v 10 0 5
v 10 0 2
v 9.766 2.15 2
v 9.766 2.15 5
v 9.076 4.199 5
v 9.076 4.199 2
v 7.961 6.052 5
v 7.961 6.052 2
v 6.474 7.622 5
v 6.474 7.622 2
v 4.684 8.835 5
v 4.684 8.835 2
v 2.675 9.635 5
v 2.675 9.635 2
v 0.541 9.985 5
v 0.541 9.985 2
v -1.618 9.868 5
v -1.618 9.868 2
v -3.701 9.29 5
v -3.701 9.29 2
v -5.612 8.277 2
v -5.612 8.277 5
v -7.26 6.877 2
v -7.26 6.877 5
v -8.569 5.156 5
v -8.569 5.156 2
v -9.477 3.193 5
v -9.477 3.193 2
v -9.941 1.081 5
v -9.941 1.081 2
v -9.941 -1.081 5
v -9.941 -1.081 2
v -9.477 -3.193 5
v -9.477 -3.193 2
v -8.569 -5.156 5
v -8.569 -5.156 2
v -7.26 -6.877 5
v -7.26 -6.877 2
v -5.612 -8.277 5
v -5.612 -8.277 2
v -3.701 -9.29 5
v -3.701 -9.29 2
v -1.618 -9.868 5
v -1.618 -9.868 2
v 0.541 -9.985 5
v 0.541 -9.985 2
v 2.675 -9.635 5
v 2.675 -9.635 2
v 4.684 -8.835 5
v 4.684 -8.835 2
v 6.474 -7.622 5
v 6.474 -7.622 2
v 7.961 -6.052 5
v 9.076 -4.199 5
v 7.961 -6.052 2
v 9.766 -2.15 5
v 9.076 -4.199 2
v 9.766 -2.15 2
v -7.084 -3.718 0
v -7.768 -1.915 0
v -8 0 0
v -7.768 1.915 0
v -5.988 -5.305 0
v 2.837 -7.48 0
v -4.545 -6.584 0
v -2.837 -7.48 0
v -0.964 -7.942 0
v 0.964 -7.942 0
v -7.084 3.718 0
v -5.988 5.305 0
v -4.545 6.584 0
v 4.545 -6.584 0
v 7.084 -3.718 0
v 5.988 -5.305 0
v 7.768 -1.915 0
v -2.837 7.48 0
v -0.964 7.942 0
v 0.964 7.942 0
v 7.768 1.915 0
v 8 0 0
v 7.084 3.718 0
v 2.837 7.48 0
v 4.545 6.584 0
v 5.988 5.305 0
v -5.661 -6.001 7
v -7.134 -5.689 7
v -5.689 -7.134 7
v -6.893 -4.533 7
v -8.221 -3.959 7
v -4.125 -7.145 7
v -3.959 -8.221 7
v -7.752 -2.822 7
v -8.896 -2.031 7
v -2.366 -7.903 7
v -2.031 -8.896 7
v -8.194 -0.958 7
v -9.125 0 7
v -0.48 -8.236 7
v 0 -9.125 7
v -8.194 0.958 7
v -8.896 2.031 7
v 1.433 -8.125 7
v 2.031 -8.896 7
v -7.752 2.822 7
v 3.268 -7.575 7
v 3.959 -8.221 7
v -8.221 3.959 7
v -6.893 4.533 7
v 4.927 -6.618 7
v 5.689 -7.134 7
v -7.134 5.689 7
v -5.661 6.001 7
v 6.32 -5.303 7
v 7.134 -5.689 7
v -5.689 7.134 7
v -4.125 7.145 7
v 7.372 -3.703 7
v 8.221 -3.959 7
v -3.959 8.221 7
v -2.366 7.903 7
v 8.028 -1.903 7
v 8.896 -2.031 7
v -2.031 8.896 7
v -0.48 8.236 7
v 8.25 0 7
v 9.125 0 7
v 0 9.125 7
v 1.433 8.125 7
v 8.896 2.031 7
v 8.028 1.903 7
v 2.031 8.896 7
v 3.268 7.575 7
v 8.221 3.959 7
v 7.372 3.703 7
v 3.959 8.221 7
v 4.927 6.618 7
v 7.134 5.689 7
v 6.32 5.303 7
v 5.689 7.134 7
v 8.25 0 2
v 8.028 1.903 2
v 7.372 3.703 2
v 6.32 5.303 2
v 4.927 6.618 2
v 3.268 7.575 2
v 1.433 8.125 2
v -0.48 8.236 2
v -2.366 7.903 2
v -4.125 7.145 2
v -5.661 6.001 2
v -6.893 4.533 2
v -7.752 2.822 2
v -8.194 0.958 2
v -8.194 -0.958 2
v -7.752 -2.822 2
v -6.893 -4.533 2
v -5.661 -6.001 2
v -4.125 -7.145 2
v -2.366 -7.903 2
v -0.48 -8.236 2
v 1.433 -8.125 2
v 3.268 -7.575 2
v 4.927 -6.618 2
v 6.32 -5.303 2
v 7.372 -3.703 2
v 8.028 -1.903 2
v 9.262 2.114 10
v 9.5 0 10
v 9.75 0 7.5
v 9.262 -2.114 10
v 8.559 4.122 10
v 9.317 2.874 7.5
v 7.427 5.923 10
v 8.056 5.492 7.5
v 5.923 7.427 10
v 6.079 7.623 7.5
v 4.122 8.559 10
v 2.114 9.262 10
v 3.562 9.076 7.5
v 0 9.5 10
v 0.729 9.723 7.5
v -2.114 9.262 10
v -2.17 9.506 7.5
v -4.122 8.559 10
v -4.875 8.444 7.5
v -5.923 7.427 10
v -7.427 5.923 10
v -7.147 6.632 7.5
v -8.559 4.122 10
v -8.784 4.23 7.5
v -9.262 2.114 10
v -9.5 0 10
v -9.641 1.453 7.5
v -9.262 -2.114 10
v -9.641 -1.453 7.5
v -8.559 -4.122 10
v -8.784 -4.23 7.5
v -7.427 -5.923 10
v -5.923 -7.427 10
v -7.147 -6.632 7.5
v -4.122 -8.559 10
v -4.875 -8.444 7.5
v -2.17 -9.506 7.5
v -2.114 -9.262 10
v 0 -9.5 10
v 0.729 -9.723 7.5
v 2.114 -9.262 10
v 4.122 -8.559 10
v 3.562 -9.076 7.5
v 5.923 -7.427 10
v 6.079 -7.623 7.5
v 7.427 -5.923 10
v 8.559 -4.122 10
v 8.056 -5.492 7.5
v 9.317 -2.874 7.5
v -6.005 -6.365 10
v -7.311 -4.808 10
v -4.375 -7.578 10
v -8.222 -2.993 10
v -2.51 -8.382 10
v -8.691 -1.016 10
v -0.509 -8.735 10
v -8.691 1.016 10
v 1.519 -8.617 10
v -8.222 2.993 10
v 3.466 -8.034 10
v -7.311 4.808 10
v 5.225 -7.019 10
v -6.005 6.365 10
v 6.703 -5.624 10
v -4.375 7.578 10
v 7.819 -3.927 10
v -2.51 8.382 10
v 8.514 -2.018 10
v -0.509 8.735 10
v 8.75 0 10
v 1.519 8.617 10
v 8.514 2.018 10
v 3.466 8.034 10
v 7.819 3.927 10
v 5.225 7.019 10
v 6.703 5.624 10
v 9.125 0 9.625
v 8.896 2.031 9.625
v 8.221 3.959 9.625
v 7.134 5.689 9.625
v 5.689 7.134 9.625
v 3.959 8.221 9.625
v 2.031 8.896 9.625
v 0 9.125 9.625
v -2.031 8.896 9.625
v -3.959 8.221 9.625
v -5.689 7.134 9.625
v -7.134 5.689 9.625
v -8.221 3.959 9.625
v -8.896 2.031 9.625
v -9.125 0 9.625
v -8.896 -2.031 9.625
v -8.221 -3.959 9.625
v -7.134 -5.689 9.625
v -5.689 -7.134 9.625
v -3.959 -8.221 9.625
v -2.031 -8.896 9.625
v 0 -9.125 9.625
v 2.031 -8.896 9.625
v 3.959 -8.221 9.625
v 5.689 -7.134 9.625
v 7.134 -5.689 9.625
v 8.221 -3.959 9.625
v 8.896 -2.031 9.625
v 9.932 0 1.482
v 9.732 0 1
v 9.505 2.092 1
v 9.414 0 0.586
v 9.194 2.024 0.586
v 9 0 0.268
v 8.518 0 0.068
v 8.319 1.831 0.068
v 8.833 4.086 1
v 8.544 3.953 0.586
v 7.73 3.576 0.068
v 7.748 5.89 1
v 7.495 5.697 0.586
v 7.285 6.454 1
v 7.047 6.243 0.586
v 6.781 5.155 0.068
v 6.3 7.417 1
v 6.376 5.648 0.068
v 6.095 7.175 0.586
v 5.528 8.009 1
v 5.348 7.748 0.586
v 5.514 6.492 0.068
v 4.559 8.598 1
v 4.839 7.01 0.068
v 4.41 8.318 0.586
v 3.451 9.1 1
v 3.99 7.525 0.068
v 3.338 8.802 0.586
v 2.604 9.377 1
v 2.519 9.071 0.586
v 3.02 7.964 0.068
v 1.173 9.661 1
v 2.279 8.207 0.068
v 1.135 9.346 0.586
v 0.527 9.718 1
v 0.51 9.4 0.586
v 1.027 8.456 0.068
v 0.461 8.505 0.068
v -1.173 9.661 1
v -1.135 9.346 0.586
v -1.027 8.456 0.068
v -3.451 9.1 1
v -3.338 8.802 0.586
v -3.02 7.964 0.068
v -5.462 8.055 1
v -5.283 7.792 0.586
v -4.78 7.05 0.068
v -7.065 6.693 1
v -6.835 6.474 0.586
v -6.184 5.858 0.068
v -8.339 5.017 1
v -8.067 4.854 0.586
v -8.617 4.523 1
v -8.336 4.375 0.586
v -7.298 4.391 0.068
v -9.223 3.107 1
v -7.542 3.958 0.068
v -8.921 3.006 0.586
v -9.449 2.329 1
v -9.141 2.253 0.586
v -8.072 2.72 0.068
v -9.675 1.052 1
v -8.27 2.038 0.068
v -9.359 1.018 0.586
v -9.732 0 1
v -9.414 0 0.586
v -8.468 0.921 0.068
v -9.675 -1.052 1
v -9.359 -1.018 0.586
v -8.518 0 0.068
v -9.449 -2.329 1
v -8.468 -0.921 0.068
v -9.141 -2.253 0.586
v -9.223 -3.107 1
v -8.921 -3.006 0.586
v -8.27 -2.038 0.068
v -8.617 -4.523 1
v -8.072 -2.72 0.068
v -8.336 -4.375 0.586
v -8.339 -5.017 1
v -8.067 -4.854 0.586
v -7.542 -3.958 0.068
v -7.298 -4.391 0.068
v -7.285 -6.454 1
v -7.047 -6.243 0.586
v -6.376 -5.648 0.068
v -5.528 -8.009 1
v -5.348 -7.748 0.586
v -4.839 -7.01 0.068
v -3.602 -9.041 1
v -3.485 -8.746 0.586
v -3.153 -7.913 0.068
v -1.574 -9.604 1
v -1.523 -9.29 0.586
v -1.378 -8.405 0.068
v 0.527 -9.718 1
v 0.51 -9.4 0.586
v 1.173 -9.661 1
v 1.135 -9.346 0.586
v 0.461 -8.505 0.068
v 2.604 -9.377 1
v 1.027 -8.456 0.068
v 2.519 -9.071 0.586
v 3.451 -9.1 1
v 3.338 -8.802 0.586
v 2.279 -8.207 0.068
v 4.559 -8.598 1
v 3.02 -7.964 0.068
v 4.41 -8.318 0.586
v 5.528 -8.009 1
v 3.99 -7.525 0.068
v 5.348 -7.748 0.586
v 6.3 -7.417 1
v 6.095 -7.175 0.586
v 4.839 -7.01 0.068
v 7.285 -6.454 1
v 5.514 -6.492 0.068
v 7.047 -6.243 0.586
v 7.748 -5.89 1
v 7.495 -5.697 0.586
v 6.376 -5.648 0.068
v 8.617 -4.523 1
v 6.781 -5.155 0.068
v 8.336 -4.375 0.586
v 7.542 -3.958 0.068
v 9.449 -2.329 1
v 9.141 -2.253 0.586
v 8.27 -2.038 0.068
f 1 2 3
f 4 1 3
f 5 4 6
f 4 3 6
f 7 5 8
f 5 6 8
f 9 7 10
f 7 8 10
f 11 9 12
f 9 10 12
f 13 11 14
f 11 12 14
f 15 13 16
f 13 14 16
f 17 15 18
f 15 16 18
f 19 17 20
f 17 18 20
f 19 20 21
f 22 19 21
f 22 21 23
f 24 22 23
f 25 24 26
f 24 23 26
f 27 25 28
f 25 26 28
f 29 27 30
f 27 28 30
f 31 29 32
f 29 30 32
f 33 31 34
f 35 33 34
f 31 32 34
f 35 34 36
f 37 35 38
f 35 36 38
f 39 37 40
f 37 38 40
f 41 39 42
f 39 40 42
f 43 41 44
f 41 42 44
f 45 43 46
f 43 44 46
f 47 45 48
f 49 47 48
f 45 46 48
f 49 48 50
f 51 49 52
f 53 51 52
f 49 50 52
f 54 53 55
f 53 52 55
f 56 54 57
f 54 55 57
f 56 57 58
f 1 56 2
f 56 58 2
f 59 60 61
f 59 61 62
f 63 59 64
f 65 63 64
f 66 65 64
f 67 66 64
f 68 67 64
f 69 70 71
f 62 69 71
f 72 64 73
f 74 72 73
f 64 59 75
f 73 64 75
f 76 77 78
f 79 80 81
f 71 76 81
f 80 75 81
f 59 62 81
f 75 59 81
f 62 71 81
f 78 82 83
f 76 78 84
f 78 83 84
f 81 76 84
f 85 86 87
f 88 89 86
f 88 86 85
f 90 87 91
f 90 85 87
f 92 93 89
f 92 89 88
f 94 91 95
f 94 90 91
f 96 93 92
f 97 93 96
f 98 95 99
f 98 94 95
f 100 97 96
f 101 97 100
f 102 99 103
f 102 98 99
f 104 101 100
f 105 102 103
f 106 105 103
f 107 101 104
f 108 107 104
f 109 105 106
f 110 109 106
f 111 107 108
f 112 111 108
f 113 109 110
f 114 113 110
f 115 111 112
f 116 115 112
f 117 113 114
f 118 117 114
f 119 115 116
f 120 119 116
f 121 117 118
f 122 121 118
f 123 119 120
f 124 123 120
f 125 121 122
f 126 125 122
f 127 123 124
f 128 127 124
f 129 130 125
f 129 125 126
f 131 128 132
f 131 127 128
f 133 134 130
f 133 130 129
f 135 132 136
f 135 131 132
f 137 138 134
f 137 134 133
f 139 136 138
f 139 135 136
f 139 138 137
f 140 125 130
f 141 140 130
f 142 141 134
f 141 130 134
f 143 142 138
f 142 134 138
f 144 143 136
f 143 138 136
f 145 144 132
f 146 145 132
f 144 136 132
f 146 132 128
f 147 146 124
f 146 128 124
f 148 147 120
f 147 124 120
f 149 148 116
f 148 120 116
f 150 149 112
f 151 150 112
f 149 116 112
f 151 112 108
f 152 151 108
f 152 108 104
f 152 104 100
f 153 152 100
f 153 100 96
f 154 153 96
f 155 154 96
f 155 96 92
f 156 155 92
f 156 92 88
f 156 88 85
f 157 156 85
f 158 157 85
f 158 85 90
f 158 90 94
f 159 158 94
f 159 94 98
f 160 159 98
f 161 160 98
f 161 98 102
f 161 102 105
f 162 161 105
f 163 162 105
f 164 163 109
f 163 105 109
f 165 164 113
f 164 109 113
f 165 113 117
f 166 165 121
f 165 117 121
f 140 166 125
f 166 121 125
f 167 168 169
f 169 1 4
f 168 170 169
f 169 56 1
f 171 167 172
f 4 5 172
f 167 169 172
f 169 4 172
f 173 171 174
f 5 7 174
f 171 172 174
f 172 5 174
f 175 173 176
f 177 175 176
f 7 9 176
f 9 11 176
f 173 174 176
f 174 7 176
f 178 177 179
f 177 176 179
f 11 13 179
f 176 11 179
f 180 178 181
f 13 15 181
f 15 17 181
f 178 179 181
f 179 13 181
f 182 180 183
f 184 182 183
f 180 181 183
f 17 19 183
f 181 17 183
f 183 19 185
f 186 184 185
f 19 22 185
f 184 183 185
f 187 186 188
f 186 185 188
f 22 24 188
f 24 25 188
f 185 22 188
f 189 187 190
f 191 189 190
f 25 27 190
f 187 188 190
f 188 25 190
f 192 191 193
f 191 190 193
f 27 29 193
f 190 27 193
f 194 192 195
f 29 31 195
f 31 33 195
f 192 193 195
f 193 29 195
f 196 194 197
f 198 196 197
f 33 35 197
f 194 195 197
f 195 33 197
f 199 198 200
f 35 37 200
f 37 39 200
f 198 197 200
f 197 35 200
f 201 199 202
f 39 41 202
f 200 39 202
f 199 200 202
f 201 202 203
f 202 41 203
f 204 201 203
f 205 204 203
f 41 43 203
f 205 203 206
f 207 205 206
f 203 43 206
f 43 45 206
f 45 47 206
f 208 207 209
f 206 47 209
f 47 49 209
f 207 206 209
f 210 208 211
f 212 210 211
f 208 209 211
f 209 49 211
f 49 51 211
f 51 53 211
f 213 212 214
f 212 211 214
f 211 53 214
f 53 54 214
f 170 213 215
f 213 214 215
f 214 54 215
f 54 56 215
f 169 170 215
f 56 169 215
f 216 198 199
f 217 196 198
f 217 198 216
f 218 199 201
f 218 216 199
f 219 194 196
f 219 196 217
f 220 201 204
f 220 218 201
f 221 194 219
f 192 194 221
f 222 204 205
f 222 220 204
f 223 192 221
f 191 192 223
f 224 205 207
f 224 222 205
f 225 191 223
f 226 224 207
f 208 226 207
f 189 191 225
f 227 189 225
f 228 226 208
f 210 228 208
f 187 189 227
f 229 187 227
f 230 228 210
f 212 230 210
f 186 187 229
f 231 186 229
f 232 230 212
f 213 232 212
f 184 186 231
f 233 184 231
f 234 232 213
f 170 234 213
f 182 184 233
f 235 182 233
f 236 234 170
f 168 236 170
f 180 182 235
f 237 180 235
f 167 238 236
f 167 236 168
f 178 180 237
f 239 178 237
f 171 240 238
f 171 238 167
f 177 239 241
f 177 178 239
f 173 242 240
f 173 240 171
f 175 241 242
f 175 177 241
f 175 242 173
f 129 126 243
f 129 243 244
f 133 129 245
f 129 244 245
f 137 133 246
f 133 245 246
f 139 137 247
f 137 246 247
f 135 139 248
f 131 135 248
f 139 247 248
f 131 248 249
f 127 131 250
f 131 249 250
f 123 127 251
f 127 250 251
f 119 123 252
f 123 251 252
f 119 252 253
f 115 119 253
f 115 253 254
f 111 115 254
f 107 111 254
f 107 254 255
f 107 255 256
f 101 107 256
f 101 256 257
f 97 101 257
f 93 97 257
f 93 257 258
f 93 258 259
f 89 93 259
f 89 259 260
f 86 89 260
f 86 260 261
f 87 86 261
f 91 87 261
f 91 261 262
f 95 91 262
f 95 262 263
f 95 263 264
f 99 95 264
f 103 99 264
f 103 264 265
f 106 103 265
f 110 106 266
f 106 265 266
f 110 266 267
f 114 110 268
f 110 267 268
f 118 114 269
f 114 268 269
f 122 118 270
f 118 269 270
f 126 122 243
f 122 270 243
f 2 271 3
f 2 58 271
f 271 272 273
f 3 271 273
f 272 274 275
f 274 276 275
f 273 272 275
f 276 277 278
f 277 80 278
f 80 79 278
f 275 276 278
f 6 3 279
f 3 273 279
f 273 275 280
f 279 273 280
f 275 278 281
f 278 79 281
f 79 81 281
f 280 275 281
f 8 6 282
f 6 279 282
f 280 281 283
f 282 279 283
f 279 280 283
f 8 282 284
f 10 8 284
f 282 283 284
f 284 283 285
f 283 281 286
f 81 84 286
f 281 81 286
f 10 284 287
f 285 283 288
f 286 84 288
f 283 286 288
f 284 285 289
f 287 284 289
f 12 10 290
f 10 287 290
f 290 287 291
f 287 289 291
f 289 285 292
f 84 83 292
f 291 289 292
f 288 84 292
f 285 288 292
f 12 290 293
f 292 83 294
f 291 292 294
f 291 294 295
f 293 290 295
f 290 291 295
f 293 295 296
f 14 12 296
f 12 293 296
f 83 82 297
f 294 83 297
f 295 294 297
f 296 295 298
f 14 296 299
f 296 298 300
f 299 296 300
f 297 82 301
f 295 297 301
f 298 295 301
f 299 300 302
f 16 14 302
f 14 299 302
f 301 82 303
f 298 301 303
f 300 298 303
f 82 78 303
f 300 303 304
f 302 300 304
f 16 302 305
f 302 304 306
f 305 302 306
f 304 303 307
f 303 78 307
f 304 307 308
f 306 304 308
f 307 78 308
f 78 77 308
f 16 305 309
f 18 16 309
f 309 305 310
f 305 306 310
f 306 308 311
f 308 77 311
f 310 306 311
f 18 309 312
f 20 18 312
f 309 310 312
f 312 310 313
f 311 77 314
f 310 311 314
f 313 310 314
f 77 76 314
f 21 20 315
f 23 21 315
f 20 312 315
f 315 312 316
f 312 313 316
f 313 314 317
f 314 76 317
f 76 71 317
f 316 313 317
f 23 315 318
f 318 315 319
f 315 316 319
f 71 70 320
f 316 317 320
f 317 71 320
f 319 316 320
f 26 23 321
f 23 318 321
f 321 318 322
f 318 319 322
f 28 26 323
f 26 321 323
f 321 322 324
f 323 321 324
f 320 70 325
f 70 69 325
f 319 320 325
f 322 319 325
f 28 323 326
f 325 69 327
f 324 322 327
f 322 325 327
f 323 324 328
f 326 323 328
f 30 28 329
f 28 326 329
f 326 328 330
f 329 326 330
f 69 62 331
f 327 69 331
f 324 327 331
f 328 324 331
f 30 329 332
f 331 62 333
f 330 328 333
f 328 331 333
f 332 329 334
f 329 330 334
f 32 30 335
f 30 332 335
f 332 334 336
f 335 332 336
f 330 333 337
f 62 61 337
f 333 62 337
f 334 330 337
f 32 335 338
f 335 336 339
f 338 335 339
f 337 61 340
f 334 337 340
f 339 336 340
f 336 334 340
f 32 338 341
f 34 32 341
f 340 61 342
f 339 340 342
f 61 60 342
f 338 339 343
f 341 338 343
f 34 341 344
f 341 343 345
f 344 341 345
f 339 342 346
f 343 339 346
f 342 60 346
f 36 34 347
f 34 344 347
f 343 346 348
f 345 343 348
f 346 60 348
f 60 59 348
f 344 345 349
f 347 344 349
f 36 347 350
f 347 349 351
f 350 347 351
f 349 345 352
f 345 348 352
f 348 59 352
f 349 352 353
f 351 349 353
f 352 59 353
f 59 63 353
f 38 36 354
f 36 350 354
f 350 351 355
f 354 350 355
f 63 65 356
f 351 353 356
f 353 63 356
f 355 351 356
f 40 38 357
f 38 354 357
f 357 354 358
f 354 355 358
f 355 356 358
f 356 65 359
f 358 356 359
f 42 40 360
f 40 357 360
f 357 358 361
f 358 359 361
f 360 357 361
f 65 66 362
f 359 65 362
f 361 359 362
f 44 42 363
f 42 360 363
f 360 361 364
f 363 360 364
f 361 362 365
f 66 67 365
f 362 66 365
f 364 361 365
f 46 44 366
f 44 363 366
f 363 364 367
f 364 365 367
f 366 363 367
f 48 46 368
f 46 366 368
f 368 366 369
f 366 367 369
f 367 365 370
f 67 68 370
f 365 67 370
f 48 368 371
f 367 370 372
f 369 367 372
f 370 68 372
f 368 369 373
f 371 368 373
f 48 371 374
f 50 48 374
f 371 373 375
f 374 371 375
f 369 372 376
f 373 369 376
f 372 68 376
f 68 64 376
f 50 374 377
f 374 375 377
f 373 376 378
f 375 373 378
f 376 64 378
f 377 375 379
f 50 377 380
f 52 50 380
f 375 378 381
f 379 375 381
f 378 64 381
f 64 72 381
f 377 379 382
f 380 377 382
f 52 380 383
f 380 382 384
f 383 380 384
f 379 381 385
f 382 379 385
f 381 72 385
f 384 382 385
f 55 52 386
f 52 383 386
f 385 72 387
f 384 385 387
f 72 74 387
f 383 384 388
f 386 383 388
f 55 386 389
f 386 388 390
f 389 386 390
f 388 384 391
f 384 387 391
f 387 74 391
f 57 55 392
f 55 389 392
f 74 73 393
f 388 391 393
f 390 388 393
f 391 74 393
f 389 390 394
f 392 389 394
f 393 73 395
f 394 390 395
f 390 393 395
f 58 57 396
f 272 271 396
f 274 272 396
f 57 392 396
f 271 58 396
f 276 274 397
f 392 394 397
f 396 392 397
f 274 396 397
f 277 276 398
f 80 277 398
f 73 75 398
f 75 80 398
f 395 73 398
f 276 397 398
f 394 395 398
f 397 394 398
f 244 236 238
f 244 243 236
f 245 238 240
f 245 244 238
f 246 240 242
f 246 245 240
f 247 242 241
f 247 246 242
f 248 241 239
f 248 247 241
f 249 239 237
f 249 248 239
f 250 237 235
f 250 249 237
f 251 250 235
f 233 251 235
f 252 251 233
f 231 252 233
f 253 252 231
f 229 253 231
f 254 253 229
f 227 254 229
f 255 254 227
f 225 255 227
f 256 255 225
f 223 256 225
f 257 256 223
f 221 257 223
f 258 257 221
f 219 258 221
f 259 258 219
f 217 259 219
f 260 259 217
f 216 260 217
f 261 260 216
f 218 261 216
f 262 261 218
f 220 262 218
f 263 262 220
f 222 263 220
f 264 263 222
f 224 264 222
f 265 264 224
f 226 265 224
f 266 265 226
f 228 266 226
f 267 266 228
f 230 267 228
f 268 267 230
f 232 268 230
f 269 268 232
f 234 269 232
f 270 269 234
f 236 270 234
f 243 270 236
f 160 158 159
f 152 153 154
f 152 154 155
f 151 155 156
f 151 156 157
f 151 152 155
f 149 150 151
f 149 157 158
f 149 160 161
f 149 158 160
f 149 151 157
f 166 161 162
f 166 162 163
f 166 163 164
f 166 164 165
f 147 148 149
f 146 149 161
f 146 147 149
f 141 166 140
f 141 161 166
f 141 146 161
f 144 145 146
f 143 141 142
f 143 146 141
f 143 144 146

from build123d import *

# Parameters (mm, degrees)
F0_R        = 10
F1_DEPTH    = 10
F2_R        = 8.25
F3_DEPTH    = 8
F4_R        = 9.125
F4_R_2      = 8.25
F5_DEPTH    = 3
F6_R        = 9.125
F6_R_2      = 8.75
F7_DEPTH    = 1
F8_R        = 2
F9_S5_R     = 9.125
F9_T6_DEPTH = 15
F10_SIZE2   = 5
F10_SIZE    = 0.5


# Not quite as in the source:
# - a fillet or chamfer that OpenCascade refuses, or shapes differently, is made with other operations: its cross-section is extruded or revolved along the edge and cut away or added


with BuildPart() as f1:
    # F0 (on Top) → F1 (new body)
    with BuildSketch(Plane.XY):
        Circle(F0_R)
    extrude(amount=F1_DEPTH)

    # F2 (on face) → F3 (cut)
    with BuildSketch(Plane.XY.offset(10)):
        Circle(F2_R)
    extrude(amount=-F3_DEPTH, mode=Mode.SUBTRACT)

    # F4 (on face) → F5 (cut)
    with BuildSketch(Plane.XY.offset(10)):
        Circle(F4_R)
        Circle(F4_R_2, mode=Mode.SUBTRACT)
    extrude(amount=-F5_DEPTH, mode=Mode.SUBTRACT)

    # F6 (on face) → F7 (join)
    with BuildSketch(Plane.XY.offset(10)):
        Circle(F6_R)
        Circle(F6_R_2, mode=Mode.SUBTRACT)
    extrude(amount=-F7_DEPTH)

    # F8
    f8_edges = [f1.edges().sort_by_distance(p)[0] for p in [
        (-10, 0, 0),
    ]]
    fillet(f8_edges, radius=F8_R)

    # F9: chamfer of 1 on 1 edges, made by hand


with BuildPart() as f9_tool2:
    # F9_s3 → F9_t4 (revolve)
    with BuildSketch(Plane.XZ):
        Polygon((8.75, 10), (9.75, 9), (8.75, 9), align=None)
    revolve(axis=Axis((0, 0, 9), (0, 0, 1)))

    # F9_s5 → F9_t6 (intersect, symmetric)
    with BuildSketch(Plane.XY.offset(9.5)):
        Circle(F9_S5_R)
    extrude(amount=F9_T6_DEPTH, both=True, mode=Mode.INTERSECT)


with BuildPart() as f1_1:
    add(f1.part)

    # F9_t1: cut F9_tool2
    add(f9_tool2.part, mode=Mode.SUBTRACT)

    # F10
    f10_edges = [f1_1.edges().sort_by_distance(p)[0] for p in [
        (-10, 0, 10),
    ]]
    f10_side = f1_1.faces().sort_by_distance((-9.717157, 0, 10))[0]
    chamfer(f10_edges, length=F10_SIZE, length2=F10_SIZE2, reference=f10_side)


solid = f1_1.part
